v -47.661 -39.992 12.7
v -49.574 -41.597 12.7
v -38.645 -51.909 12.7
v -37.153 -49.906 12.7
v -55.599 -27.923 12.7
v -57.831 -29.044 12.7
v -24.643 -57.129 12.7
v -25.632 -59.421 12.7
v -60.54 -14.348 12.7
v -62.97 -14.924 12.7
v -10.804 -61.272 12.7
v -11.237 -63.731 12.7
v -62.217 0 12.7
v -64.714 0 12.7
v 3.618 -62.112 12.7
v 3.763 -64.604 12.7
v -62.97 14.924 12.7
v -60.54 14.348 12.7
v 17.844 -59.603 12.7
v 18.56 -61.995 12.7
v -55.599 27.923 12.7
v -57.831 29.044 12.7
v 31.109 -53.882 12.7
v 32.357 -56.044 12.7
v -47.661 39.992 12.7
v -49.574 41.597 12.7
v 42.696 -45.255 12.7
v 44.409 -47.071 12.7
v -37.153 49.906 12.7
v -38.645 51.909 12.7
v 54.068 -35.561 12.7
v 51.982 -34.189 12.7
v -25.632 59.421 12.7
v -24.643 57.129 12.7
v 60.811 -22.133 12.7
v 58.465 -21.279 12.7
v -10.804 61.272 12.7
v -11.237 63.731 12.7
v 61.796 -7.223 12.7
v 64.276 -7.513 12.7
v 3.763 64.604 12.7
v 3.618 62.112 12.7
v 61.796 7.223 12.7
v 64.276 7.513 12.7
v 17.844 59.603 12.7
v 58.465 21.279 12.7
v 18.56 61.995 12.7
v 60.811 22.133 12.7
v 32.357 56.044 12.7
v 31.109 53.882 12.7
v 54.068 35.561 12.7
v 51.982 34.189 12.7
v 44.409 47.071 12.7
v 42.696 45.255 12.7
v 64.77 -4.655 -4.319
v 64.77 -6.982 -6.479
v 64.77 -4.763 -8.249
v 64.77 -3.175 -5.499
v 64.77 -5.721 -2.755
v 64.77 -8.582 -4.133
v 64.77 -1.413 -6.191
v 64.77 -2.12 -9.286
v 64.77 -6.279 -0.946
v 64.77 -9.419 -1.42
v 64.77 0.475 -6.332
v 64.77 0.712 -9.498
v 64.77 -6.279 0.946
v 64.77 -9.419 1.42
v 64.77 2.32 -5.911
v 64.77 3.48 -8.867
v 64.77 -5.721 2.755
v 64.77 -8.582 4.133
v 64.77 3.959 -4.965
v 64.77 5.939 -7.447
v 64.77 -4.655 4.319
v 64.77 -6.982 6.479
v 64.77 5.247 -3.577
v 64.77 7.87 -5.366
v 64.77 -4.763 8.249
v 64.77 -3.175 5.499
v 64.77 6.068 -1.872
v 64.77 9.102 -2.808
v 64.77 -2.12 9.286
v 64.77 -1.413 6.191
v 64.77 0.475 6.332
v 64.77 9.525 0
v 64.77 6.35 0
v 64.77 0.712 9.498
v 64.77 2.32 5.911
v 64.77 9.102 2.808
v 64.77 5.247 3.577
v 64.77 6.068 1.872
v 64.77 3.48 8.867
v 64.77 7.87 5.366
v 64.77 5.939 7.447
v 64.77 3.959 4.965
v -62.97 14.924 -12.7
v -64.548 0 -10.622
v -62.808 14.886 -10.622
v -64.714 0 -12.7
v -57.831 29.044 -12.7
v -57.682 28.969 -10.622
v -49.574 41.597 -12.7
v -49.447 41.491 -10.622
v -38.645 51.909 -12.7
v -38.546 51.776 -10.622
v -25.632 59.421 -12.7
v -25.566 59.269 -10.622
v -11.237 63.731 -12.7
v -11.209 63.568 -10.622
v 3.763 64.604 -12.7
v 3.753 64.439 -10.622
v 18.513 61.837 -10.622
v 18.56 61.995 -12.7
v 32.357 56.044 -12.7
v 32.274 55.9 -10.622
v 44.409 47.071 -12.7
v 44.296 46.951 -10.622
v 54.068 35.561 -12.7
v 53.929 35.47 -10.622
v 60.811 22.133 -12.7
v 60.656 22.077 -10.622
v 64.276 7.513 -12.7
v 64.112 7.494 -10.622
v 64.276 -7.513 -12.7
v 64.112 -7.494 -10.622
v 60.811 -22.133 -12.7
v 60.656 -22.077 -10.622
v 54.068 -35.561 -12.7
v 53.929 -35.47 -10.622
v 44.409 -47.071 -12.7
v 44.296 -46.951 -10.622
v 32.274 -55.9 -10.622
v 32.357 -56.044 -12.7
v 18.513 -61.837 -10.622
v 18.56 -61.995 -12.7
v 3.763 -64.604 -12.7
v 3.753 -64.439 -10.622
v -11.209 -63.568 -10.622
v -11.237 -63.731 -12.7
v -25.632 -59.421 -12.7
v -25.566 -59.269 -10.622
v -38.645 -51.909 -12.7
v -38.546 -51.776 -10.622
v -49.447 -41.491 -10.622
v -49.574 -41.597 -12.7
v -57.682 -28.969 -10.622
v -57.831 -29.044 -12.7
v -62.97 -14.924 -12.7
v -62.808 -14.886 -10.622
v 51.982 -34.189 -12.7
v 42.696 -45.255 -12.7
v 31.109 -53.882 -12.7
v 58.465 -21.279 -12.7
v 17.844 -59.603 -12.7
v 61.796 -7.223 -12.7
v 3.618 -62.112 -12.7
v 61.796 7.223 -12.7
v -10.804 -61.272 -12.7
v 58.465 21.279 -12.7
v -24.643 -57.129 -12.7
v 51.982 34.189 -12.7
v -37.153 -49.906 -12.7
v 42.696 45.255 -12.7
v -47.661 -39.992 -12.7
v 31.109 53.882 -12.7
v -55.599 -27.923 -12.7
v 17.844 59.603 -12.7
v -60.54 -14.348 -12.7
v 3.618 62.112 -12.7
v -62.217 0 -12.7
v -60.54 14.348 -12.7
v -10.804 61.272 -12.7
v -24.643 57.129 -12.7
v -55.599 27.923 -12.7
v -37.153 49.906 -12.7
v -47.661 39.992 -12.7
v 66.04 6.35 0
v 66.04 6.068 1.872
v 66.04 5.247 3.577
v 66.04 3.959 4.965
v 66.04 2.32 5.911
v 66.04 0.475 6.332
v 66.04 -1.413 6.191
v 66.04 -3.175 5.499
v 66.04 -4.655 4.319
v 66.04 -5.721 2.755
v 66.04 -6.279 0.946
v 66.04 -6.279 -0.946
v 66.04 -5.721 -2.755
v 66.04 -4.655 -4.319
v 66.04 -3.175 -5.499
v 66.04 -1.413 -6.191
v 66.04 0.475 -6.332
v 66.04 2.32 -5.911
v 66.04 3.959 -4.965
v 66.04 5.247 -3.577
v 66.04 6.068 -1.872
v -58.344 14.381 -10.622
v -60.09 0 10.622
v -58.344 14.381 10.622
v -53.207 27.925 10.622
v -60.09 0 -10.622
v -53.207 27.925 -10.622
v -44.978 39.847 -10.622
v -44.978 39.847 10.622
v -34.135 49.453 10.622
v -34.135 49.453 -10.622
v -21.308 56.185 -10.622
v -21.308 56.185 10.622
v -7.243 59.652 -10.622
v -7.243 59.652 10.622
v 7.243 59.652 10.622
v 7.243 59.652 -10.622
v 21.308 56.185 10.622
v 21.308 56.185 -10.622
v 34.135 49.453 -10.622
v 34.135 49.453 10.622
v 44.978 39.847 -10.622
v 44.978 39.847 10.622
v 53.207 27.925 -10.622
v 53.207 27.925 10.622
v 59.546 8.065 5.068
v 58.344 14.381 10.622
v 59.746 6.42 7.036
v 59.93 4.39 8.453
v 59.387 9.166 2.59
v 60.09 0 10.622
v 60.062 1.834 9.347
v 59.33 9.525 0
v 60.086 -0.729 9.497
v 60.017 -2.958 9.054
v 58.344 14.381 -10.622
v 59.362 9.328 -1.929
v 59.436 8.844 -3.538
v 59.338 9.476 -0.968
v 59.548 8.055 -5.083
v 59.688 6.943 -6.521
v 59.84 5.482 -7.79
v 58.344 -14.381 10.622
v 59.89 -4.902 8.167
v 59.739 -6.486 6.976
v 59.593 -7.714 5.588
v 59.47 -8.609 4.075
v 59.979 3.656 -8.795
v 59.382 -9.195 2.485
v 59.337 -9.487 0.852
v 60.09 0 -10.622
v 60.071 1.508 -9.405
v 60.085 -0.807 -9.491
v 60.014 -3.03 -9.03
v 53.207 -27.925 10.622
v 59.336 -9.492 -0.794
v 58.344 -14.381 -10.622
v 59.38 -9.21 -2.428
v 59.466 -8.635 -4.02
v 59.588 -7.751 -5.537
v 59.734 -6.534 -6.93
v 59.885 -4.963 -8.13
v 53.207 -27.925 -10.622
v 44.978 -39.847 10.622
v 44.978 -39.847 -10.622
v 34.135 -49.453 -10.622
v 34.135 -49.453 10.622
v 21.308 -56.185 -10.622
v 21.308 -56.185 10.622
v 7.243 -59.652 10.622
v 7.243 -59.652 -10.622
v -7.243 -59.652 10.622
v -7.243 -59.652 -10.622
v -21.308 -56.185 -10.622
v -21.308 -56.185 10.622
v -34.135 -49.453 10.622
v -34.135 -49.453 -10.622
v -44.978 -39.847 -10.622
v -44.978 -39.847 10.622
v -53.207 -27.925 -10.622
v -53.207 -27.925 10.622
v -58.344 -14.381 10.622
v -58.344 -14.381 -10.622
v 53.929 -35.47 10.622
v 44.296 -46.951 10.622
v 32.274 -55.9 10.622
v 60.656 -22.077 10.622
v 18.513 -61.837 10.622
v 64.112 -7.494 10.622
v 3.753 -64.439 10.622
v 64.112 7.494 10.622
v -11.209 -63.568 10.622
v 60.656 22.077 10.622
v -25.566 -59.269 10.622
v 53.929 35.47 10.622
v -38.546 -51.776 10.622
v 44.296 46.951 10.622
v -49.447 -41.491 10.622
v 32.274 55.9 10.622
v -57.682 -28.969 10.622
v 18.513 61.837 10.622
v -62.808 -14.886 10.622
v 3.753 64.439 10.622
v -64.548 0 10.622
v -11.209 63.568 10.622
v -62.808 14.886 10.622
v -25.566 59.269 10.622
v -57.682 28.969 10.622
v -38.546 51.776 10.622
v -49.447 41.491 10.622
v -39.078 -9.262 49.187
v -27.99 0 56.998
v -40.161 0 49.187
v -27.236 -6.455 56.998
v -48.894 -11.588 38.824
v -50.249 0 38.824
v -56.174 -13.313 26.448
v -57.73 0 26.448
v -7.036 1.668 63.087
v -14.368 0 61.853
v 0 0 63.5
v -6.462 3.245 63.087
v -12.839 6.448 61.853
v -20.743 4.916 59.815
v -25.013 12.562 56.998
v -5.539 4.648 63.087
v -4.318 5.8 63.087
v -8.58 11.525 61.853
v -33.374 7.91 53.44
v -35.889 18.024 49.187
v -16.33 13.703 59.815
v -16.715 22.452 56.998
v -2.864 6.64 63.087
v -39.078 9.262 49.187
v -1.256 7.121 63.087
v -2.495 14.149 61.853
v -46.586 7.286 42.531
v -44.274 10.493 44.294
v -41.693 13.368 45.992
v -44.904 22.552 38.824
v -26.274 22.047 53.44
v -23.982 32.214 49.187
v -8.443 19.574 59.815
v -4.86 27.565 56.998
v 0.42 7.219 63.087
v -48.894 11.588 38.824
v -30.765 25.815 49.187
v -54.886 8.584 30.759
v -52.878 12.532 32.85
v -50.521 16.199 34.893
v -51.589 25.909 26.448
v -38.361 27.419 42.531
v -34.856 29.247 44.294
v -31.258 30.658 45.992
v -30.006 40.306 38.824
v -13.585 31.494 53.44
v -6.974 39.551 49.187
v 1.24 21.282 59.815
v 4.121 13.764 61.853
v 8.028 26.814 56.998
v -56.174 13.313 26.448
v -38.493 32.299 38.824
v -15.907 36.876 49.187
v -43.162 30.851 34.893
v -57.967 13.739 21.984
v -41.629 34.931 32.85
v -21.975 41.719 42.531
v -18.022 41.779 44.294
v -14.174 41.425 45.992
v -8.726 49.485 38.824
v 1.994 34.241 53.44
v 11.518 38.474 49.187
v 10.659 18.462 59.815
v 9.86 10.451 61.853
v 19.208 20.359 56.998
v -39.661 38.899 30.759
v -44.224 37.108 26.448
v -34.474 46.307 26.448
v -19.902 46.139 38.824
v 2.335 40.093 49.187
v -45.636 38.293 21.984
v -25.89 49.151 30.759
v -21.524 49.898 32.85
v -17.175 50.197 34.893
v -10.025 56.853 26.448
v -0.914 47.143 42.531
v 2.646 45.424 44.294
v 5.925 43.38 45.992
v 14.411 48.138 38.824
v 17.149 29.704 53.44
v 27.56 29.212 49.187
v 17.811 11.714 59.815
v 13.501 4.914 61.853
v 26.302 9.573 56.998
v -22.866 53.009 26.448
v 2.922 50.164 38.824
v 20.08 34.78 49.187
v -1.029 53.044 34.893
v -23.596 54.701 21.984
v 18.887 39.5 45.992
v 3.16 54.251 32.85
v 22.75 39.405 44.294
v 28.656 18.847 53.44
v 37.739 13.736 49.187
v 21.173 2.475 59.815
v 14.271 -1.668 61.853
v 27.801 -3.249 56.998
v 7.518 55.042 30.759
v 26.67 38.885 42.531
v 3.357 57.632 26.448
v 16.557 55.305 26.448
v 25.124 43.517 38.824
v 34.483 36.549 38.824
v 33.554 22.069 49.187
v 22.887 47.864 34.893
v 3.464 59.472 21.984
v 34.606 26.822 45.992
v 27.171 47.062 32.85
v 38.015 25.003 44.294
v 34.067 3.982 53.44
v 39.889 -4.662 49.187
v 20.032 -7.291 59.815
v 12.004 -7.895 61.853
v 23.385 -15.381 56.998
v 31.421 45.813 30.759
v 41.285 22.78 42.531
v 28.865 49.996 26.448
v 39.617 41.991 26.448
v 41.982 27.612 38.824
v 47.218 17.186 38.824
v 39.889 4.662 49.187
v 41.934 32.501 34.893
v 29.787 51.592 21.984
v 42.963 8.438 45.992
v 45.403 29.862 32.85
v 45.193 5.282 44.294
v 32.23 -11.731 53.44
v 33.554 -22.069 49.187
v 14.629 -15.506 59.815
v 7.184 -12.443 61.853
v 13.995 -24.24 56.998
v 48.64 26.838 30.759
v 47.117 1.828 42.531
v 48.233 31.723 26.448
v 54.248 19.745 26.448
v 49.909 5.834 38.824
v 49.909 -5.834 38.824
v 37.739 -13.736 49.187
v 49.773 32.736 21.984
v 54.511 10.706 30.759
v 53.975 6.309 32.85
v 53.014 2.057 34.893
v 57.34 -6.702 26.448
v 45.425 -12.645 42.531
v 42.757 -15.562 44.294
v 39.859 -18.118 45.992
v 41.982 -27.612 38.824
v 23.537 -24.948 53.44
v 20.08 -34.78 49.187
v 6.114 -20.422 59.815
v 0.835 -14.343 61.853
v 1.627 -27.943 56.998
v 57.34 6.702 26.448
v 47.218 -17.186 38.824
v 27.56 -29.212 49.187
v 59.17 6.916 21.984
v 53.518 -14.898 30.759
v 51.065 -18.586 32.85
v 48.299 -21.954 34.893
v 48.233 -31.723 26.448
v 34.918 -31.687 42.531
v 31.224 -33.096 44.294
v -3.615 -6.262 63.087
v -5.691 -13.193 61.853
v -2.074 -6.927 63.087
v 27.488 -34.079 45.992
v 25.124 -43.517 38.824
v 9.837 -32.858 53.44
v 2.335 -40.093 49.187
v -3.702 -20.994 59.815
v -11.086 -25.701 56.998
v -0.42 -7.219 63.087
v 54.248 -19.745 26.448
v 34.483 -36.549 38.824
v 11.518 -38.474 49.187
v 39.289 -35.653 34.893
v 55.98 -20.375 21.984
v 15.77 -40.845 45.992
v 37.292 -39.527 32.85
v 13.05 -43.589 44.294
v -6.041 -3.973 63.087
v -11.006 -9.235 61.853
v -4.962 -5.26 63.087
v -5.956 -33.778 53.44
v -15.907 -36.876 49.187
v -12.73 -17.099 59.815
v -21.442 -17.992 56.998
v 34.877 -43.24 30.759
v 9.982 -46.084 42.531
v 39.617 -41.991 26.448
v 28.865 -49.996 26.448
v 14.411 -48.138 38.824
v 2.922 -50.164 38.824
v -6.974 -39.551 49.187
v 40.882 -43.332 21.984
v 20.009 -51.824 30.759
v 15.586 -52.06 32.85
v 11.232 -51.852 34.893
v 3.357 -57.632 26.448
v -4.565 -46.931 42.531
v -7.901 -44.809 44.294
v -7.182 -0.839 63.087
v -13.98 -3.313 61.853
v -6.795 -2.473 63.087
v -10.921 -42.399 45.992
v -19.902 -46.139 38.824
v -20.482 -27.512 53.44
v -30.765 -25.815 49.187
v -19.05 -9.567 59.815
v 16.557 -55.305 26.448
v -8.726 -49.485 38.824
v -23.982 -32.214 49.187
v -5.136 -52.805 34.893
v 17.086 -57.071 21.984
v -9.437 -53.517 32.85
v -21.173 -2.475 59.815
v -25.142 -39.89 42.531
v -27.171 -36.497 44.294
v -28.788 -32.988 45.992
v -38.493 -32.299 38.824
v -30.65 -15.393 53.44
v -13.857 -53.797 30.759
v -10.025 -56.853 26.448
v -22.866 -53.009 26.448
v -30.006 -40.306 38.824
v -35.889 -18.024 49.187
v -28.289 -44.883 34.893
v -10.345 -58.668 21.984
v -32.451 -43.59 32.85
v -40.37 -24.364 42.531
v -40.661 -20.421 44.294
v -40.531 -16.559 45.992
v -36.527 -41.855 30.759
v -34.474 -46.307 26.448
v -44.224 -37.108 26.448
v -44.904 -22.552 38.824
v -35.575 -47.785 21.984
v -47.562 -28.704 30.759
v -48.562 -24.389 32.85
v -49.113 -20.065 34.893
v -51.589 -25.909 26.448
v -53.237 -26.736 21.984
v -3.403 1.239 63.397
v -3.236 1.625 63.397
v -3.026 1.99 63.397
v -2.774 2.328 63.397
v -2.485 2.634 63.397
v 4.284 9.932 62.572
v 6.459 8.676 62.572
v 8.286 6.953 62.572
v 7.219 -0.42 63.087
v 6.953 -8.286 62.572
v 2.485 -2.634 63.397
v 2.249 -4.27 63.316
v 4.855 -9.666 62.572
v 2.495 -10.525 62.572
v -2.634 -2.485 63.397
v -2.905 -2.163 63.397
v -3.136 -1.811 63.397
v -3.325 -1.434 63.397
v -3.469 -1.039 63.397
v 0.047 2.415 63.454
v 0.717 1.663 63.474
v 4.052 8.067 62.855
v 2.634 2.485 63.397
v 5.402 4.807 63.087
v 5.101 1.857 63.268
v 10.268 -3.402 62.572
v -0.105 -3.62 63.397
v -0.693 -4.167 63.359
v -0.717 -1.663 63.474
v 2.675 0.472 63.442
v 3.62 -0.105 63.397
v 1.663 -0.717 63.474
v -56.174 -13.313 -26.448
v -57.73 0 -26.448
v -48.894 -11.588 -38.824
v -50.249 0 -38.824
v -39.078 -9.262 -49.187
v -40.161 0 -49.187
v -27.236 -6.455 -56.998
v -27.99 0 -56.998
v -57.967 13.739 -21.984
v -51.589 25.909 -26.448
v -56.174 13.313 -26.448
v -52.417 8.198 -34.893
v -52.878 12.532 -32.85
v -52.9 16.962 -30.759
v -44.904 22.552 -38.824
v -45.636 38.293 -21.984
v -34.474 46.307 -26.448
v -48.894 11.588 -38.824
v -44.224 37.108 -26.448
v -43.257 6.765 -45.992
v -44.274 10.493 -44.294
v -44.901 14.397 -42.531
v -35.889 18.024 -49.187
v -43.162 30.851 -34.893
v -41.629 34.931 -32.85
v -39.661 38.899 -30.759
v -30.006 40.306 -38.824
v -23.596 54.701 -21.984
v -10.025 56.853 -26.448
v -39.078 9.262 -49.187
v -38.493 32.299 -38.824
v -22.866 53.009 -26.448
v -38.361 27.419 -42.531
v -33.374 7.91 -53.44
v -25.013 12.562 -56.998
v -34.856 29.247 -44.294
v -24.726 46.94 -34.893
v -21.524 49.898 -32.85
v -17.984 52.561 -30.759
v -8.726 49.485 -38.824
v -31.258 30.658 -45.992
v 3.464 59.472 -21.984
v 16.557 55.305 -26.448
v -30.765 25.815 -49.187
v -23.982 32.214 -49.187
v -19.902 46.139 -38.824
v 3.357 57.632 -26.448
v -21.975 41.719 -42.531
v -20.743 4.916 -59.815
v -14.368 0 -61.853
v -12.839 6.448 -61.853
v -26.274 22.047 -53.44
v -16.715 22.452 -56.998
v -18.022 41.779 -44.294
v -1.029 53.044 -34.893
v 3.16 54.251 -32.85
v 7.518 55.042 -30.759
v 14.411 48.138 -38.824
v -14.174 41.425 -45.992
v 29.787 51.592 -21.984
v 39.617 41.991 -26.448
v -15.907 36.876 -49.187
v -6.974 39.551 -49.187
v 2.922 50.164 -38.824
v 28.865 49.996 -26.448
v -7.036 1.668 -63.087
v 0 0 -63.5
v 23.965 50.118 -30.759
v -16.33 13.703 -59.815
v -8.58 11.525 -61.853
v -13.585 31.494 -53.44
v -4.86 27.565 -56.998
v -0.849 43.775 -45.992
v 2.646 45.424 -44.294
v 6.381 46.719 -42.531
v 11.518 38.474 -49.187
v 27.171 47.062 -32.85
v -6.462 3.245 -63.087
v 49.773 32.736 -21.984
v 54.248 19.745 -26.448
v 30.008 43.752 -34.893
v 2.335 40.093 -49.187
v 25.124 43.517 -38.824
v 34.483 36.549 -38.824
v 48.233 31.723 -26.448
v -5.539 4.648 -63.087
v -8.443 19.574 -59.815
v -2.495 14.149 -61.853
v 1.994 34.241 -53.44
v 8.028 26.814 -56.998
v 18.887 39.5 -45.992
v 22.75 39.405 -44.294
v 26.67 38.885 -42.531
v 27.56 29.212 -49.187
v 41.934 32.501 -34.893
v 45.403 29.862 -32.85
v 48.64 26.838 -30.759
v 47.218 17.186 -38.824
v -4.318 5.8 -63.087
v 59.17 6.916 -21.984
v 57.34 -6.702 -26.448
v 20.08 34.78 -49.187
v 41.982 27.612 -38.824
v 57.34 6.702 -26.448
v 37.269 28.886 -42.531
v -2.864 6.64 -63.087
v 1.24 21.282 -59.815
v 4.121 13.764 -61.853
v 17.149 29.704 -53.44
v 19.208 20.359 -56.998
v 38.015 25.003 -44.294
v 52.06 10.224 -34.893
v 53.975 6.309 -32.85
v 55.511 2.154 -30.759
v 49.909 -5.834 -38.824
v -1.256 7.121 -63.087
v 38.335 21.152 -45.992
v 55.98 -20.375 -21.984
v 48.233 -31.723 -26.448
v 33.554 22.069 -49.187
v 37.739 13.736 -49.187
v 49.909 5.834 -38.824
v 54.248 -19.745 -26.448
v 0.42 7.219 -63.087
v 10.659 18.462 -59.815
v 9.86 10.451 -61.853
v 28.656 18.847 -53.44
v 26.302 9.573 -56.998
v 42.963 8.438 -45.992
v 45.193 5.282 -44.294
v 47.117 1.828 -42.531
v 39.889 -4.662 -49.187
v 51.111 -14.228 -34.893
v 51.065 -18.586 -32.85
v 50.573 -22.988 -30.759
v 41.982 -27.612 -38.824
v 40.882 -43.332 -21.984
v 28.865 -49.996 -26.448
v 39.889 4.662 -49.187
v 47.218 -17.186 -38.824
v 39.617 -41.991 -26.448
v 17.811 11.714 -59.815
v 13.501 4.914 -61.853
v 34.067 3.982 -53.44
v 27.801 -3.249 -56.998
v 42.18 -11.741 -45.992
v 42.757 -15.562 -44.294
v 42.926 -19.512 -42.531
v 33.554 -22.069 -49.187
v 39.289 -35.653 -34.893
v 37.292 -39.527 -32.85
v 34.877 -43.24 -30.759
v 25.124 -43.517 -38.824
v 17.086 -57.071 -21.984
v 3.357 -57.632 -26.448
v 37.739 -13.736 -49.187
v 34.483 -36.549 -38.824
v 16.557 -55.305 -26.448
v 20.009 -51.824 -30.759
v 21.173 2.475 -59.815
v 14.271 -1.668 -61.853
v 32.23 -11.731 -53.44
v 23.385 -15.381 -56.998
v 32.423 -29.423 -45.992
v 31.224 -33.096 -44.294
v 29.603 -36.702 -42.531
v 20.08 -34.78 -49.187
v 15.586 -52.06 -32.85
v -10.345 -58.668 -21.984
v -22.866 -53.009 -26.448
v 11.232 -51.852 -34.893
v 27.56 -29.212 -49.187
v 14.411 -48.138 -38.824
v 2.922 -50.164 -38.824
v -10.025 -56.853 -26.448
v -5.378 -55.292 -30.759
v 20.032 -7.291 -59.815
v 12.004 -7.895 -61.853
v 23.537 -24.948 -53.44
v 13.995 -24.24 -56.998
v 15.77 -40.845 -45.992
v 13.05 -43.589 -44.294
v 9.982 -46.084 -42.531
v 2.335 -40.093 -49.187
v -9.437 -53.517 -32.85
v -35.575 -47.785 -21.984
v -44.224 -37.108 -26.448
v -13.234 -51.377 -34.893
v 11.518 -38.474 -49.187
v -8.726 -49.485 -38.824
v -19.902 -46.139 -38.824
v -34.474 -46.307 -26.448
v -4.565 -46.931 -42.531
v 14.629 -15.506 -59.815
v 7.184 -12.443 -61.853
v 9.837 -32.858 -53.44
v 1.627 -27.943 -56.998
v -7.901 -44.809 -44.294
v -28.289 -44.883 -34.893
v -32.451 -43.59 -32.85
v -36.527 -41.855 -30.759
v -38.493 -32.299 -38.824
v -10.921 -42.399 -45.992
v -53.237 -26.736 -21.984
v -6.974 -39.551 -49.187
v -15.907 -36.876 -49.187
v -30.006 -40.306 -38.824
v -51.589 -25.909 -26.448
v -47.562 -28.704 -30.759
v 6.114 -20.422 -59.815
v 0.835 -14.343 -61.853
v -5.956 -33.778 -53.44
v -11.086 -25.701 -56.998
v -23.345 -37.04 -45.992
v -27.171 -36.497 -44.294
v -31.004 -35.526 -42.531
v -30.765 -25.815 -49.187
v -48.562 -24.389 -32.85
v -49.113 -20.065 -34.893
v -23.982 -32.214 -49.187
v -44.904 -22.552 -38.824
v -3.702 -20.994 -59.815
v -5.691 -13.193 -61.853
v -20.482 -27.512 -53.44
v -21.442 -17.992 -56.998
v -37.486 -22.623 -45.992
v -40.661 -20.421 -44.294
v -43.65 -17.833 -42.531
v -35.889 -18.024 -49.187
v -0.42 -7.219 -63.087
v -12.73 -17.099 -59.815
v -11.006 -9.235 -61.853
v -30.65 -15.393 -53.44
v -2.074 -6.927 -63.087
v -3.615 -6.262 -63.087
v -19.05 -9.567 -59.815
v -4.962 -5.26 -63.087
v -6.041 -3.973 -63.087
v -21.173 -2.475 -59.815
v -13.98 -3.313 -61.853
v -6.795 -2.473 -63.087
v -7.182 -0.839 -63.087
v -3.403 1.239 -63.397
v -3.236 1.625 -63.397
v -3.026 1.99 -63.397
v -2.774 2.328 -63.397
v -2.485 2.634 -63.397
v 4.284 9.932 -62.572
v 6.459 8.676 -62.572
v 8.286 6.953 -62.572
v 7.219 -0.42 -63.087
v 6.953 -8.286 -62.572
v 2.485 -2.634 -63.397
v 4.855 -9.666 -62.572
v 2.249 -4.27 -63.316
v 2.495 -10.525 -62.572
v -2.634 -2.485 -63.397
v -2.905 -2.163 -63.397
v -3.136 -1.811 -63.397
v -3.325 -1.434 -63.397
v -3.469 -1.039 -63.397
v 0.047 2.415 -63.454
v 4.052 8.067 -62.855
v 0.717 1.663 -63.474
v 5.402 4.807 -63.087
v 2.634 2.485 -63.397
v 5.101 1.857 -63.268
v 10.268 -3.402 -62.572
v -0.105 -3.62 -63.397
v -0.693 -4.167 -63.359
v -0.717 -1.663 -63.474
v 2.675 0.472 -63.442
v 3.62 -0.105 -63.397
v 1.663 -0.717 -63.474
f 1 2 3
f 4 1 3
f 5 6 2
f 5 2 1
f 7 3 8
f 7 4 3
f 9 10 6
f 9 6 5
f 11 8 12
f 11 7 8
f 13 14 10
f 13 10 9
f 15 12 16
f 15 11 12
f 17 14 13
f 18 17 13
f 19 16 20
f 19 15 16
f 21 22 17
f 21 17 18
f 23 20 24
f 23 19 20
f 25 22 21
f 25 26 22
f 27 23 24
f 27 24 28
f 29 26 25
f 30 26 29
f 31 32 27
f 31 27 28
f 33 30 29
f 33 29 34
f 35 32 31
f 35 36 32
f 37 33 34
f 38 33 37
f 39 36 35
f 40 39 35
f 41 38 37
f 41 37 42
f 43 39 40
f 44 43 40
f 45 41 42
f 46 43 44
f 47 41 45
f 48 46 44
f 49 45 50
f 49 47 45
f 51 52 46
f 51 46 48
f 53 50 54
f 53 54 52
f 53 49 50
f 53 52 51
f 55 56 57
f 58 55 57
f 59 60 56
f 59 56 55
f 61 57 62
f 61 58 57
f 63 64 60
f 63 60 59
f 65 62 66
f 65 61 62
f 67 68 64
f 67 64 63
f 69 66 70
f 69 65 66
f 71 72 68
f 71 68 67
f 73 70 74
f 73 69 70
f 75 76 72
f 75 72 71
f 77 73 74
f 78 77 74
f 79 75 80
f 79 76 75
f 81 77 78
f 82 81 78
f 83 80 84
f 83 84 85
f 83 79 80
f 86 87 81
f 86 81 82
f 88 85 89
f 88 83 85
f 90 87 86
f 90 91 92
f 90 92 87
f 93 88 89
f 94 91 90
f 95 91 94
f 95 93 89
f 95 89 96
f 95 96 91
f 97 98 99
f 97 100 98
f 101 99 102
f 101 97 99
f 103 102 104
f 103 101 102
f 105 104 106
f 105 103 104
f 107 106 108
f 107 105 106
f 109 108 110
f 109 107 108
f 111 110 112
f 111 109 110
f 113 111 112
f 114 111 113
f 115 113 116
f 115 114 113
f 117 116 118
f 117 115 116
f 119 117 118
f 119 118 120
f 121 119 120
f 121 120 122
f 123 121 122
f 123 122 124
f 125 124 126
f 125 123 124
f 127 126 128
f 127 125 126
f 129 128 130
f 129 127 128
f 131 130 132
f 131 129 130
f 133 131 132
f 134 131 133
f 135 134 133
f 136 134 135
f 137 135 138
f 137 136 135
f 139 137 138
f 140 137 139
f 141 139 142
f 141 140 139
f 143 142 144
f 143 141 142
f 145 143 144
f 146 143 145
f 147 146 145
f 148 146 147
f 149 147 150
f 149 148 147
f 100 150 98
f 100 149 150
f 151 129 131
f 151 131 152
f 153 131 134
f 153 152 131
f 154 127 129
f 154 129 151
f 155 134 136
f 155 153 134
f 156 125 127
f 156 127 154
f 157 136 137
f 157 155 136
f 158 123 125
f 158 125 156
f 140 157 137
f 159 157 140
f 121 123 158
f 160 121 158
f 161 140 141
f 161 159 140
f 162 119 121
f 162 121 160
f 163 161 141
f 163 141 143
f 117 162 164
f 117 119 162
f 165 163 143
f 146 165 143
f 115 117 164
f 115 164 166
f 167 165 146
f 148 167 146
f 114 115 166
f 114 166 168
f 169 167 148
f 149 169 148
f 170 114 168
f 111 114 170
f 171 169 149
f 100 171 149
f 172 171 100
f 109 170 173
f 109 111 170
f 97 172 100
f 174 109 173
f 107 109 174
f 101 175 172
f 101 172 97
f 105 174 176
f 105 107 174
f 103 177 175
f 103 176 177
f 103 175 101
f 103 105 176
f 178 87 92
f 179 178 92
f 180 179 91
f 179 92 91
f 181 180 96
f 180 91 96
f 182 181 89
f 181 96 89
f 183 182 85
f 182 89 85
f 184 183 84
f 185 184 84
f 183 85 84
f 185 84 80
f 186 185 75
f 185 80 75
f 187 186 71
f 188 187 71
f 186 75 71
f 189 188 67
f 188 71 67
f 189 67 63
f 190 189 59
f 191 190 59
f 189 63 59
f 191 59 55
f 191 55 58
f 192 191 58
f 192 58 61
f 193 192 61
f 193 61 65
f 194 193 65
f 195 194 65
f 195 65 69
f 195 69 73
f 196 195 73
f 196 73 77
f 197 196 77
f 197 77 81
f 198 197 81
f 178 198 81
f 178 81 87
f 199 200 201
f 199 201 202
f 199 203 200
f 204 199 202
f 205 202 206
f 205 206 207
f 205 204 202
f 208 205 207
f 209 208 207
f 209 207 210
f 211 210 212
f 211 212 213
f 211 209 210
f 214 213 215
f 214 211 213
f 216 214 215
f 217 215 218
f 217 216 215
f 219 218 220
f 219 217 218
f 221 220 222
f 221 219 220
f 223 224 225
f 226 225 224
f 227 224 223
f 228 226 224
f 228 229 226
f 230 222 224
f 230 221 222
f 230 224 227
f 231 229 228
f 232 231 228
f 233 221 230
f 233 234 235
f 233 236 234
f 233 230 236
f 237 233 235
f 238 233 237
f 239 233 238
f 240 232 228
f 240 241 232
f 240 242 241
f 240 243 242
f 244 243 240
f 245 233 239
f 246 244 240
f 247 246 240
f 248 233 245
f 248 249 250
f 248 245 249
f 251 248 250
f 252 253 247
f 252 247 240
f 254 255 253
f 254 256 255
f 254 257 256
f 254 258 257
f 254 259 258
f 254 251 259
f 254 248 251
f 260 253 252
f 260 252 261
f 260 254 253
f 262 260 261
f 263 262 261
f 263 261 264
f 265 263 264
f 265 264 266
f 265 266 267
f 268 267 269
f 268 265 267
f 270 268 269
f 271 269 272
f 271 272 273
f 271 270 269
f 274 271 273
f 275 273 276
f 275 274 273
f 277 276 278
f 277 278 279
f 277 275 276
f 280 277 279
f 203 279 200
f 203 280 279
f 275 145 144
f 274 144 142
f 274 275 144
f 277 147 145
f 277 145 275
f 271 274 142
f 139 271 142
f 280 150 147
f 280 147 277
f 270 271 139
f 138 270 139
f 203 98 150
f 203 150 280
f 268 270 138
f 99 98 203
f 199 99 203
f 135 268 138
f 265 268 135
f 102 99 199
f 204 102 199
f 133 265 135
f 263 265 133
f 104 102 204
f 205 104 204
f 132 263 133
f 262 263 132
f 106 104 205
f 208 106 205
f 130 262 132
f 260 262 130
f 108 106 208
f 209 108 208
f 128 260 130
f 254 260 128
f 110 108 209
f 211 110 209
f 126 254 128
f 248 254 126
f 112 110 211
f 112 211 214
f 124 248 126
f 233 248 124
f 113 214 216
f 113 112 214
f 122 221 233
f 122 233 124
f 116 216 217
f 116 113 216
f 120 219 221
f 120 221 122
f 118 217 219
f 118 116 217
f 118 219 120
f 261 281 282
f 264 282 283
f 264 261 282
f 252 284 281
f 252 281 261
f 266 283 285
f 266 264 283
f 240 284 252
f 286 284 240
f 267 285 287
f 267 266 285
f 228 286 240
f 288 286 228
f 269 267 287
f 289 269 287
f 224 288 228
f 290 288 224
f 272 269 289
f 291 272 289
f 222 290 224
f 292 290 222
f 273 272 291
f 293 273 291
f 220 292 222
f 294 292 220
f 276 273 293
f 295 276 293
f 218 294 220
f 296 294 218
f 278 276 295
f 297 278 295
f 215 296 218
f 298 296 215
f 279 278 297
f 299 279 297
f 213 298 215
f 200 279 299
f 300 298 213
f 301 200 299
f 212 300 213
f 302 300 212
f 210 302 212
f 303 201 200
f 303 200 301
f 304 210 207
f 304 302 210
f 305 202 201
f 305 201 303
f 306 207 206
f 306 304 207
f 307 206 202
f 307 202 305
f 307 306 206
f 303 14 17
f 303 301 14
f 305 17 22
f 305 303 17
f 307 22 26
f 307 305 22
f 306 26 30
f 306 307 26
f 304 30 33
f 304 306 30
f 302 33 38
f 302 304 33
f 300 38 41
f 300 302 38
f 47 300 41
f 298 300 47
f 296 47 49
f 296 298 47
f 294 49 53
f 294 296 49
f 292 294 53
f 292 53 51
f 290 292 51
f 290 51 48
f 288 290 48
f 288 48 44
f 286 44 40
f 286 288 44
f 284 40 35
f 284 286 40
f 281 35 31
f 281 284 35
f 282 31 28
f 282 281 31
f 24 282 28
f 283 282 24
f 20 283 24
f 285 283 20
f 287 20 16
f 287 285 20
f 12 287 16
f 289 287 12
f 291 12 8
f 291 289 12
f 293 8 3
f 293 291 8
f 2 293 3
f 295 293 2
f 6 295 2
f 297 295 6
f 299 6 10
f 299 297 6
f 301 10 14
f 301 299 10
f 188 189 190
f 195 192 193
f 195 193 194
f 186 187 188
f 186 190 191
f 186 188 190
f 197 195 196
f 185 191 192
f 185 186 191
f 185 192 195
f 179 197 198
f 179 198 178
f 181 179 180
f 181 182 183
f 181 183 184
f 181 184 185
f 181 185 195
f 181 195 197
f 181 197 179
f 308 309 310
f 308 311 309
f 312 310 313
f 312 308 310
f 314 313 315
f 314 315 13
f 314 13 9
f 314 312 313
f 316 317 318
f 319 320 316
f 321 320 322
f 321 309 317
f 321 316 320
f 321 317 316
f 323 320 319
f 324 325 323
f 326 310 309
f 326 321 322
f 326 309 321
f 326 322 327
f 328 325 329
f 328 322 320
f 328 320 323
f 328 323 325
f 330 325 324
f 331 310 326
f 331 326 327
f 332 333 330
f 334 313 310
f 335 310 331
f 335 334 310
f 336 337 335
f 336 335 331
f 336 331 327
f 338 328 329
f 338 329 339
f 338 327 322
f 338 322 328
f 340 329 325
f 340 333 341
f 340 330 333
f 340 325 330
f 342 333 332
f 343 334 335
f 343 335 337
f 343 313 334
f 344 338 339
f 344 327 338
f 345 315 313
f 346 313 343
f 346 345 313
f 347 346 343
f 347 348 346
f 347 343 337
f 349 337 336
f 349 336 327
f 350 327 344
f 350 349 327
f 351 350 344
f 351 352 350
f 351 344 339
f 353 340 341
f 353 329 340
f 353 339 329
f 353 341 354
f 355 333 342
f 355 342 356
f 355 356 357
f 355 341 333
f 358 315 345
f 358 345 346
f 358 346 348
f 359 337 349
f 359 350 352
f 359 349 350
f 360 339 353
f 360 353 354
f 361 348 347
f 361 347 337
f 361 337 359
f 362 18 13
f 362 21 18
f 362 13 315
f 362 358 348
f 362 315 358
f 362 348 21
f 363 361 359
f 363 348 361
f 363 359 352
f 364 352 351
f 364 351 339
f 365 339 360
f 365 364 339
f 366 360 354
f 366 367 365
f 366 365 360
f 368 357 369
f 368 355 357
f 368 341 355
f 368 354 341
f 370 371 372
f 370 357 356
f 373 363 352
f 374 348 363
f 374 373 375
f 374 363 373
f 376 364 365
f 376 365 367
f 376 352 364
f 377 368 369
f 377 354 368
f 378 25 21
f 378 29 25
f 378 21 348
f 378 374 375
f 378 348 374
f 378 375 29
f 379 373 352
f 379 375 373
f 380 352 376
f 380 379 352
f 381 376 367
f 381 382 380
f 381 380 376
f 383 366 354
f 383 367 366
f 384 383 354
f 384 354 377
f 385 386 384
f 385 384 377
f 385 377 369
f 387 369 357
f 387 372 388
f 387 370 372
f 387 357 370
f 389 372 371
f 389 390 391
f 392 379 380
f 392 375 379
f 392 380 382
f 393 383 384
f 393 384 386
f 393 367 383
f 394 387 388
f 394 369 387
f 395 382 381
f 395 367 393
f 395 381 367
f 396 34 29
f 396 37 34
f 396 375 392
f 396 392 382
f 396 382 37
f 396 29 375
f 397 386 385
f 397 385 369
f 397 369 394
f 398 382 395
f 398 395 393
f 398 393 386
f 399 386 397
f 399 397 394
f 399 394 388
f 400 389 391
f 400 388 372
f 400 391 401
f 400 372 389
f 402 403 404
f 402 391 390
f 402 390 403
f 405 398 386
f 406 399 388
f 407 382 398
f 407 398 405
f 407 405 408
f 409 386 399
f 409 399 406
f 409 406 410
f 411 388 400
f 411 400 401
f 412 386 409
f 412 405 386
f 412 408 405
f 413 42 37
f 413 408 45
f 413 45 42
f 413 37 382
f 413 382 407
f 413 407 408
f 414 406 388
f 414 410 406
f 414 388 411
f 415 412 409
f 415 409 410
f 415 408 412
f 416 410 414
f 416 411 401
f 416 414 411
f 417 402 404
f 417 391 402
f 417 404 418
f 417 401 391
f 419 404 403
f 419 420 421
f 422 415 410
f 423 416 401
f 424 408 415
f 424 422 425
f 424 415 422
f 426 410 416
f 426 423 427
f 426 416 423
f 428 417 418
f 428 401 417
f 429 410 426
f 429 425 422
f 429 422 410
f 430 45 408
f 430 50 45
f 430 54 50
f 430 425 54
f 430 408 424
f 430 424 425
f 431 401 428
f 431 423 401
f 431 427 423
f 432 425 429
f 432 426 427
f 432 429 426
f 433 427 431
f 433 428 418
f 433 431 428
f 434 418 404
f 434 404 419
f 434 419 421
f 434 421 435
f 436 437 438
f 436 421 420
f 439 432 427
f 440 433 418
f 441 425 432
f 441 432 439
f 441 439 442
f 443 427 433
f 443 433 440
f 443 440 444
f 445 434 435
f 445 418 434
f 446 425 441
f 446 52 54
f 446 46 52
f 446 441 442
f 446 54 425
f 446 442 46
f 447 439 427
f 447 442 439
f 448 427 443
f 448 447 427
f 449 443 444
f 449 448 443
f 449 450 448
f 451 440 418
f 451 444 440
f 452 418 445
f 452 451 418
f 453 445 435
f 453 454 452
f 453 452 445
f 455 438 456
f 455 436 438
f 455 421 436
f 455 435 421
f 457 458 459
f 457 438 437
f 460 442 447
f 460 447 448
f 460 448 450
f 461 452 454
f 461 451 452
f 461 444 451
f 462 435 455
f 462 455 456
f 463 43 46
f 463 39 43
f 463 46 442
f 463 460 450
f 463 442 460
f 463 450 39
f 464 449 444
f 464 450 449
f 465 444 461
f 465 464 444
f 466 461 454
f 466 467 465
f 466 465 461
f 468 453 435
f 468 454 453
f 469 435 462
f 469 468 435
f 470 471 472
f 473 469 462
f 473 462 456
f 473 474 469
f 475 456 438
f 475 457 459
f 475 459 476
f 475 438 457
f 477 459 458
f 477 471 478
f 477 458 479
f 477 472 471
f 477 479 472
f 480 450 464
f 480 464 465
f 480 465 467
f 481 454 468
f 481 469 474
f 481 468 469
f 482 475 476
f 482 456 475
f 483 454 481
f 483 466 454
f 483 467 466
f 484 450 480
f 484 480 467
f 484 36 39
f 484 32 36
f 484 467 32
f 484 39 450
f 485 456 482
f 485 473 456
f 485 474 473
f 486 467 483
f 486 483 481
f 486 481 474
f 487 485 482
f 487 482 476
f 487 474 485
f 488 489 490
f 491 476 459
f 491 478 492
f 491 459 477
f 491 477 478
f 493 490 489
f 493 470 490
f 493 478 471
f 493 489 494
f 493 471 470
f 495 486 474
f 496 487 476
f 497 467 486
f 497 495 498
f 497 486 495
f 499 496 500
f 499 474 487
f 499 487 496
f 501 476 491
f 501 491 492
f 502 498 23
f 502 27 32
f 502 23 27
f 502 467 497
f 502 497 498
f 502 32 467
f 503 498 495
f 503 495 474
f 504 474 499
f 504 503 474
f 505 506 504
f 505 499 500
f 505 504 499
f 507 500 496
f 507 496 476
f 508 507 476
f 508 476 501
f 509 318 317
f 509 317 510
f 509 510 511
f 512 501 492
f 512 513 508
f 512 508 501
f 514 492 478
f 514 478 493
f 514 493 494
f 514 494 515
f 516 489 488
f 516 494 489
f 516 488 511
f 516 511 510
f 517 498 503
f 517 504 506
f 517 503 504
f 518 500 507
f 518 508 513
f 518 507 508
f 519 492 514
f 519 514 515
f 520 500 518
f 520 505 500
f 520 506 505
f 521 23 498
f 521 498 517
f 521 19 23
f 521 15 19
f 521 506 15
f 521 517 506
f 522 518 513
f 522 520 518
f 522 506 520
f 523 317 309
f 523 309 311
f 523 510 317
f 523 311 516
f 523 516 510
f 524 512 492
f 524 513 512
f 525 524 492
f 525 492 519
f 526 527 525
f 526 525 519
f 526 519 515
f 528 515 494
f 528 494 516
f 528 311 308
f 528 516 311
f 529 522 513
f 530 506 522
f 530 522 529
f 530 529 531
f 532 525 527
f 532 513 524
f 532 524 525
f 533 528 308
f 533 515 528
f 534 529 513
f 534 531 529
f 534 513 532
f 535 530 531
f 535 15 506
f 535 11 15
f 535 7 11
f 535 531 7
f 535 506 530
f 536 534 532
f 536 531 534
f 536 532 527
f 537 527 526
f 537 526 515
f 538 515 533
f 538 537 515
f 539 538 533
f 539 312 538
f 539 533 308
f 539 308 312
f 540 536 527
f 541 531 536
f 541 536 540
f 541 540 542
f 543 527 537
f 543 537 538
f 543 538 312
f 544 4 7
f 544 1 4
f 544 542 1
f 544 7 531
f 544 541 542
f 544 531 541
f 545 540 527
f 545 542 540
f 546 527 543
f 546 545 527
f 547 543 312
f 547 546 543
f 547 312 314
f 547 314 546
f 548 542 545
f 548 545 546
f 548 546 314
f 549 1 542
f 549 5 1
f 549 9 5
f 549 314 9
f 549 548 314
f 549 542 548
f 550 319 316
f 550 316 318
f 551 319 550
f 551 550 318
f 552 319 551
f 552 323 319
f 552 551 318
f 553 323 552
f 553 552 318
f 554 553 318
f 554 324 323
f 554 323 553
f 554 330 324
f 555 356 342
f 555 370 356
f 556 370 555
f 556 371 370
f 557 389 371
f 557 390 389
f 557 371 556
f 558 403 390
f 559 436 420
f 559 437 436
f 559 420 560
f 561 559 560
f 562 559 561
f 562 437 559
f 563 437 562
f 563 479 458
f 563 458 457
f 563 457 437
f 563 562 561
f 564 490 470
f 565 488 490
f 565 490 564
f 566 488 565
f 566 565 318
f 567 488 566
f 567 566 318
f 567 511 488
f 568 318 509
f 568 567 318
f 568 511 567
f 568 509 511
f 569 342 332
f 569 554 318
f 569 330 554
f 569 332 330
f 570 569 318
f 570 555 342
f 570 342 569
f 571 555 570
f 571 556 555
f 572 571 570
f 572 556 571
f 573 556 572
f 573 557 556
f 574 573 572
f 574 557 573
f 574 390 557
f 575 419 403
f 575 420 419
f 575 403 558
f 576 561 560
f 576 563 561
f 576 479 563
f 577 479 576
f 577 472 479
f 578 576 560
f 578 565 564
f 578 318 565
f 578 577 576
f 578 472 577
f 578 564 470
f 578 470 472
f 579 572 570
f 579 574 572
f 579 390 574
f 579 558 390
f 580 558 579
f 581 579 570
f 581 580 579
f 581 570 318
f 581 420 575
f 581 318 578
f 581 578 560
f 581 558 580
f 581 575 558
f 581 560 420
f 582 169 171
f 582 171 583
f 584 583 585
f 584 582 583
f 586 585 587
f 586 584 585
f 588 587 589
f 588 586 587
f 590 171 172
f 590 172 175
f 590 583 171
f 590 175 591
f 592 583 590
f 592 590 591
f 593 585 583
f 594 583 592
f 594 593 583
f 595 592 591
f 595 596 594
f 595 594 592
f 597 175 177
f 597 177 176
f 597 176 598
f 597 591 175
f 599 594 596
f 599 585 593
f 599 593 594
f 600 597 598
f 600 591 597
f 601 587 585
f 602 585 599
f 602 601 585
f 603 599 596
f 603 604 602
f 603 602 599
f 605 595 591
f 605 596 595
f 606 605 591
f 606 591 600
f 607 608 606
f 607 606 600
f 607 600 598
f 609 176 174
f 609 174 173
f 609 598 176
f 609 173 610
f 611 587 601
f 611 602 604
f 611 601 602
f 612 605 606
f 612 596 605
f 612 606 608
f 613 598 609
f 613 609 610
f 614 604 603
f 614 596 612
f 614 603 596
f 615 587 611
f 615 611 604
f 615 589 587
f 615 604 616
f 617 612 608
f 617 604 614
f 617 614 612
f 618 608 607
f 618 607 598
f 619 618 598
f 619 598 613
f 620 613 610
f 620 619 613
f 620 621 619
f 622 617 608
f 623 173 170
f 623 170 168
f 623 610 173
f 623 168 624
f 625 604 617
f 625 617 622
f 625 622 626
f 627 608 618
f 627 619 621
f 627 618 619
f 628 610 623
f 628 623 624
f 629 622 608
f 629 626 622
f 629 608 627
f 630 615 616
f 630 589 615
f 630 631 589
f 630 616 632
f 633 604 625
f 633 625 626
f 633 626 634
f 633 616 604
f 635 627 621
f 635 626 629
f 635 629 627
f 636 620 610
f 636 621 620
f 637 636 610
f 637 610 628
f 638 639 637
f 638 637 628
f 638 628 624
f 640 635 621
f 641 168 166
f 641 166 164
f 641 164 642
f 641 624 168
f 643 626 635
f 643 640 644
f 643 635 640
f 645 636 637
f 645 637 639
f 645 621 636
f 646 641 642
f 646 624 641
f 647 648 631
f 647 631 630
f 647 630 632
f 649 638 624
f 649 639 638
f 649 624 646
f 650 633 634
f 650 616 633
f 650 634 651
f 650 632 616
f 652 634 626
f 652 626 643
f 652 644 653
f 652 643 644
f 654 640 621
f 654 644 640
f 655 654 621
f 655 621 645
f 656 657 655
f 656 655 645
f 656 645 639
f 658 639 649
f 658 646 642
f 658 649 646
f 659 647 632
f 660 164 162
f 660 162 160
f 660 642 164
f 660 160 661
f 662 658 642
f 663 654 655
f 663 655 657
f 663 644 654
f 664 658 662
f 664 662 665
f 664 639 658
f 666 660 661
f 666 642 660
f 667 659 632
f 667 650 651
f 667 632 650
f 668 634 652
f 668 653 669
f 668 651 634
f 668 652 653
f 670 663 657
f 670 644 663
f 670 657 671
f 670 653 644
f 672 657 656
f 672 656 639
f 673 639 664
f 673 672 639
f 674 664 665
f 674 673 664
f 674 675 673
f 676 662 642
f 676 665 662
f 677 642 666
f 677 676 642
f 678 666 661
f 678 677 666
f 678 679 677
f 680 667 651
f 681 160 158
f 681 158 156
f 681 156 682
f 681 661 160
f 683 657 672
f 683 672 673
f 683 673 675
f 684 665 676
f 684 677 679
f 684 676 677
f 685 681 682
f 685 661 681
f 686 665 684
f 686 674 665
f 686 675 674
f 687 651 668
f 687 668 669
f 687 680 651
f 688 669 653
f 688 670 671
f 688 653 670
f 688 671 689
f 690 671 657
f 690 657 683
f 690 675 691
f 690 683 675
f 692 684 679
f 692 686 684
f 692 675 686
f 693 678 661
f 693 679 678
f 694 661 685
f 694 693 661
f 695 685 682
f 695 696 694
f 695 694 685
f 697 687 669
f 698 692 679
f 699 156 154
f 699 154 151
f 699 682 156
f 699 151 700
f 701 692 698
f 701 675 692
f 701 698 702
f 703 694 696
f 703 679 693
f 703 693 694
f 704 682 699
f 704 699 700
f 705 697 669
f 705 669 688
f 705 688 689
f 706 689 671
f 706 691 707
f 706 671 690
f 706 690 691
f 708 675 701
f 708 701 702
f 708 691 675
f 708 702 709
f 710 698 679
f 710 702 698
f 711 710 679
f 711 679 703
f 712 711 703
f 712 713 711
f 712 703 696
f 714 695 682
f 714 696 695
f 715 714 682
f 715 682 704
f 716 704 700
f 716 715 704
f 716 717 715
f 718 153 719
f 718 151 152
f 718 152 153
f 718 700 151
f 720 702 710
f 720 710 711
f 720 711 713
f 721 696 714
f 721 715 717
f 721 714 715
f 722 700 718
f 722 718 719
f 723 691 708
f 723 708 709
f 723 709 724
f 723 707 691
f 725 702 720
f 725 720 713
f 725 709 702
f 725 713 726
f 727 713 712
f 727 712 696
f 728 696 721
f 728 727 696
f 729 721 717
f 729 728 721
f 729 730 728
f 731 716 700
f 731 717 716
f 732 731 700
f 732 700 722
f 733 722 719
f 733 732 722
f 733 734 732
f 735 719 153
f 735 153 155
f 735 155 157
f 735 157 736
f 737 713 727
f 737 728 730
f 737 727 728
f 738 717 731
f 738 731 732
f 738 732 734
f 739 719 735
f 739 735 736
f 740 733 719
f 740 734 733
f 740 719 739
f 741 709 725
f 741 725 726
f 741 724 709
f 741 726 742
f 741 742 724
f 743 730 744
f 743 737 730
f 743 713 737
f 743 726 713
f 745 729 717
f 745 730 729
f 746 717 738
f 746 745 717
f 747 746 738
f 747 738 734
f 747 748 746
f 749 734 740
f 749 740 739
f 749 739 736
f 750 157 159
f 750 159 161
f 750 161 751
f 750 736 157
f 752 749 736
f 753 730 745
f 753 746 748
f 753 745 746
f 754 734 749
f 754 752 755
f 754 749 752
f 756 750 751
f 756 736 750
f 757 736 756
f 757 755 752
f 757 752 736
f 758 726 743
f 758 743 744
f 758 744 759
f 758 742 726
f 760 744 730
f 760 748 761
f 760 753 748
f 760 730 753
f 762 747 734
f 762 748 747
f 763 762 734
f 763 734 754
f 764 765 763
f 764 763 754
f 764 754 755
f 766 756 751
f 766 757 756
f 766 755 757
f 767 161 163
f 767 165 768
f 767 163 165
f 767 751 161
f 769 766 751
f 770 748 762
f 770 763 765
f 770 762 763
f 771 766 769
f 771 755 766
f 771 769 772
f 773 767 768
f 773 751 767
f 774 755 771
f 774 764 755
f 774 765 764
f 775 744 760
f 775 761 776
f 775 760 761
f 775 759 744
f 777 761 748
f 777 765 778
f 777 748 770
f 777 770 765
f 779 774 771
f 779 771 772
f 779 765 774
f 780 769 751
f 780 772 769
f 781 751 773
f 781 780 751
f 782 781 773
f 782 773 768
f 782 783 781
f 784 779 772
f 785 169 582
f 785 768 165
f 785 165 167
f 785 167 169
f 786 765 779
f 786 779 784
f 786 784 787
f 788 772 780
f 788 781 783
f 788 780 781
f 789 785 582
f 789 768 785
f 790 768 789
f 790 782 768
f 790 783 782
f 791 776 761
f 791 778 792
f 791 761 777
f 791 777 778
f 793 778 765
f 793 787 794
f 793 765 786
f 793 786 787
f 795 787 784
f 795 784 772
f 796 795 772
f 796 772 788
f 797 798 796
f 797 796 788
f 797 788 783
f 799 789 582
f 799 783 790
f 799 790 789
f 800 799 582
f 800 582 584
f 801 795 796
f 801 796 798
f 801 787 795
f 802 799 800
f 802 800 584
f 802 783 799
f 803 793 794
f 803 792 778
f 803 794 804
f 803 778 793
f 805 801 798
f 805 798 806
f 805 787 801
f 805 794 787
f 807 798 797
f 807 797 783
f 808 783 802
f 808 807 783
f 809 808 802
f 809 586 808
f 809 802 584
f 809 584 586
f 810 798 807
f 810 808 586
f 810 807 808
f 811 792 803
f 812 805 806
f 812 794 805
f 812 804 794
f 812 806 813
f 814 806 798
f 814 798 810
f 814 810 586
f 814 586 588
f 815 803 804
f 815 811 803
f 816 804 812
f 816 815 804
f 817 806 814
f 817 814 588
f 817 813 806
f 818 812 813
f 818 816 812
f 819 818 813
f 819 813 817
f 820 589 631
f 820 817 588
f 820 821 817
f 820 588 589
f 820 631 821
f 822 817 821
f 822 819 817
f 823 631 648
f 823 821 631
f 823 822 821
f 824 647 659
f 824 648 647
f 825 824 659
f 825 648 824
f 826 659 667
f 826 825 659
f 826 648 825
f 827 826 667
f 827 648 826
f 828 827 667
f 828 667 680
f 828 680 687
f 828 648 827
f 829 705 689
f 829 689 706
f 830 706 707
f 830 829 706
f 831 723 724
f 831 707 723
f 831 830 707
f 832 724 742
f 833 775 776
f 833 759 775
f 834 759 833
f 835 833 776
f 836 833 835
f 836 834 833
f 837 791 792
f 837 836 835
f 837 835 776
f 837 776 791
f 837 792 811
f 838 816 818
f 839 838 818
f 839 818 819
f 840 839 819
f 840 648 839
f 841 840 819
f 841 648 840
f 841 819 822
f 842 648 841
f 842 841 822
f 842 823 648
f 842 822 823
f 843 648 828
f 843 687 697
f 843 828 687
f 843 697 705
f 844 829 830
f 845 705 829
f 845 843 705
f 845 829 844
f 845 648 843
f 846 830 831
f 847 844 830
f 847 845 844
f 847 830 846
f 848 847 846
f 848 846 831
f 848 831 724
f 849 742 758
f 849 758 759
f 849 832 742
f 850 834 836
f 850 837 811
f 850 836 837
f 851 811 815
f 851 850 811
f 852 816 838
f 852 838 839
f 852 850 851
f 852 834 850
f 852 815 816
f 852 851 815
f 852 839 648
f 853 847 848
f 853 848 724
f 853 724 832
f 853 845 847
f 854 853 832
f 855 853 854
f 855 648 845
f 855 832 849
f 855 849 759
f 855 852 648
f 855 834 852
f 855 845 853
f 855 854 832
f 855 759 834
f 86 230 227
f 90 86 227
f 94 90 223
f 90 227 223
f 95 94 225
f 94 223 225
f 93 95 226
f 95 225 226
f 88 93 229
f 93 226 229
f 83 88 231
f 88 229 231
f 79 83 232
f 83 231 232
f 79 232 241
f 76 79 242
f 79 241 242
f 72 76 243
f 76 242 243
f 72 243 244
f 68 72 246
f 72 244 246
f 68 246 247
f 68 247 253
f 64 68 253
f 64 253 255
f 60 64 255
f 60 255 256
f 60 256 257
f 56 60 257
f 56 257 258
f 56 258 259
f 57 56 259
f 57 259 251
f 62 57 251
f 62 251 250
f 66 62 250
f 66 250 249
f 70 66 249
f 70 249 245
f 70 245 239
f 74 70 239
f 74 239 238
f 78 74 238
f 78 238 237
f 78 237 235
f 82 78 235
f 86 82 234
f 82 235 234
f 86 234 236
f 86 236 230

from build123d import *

# Parameters (mm, degrees)
F1_R     = 6.35
F2_DEPTH = 66.04
F4_R     = 9.525
F5_DEPTH = 64.77


with BuildPart() as f2:
    # F1 (on Right) → F2 (new body)
    with BuildSketch(Plane.YZ):
        Circle(F1_R)
    extrude(amount=F2_DEPTH)

    # F0 (on Front) → F3 (revolve)
    with BuildSketch(Plane.XZ):
        with BuildLine():
            Line((0, 12.7), (0, 63.5))
            ThreePointArc((0, 63.5), (-40.160926, 49.186888), (-62.217039, 12.7))
            Line((-62.217039, 12.7), (-60.090102, 12.7))
            Line((-60.090102, 12.7), (0, 12.7))
        make_face()
        Polygon((-60.090102, 12.7), (-62.217039, 12.7), (-64.71397, 12.7), (-64.548267, 10.621531), (-60.090102, 10.621531), align=None)
        Polygon((0, -12.7), (0, 12.7), (-60.090102, 12.7), (-60.090102, 10.621531), (-60.090102, -10.621531), (-60.090102, -12.7), align=None)
        with BuildLine():
            Line((0, -63.5), (0, -12.7))
            Line((0, -12.7), (-60.090102, -12.7))
            Line((-60.090102, -12.7), (-62.217039, -12.7))
            ThreePointArc((-62.217039, -12.7), (-40.160926, -49.186888), (0, -63.5))
        make_face()
        Polygon((-62.217039, -12.7), (-60.090102, -12.7), (-60.090102, -10.621531), (-64.548267, -10.621531), (-64.71397, -12.7), align=None)
    revolve(axis=Axis((0, 0, 0), (0, 0, -1)))

    # F4 (on Right) → F5 (join)
    with BuildSketch(Plane.YZ):
        Circle(F4_R)
    extrude(amount=F5_DEPTH)


solid = f2.part
